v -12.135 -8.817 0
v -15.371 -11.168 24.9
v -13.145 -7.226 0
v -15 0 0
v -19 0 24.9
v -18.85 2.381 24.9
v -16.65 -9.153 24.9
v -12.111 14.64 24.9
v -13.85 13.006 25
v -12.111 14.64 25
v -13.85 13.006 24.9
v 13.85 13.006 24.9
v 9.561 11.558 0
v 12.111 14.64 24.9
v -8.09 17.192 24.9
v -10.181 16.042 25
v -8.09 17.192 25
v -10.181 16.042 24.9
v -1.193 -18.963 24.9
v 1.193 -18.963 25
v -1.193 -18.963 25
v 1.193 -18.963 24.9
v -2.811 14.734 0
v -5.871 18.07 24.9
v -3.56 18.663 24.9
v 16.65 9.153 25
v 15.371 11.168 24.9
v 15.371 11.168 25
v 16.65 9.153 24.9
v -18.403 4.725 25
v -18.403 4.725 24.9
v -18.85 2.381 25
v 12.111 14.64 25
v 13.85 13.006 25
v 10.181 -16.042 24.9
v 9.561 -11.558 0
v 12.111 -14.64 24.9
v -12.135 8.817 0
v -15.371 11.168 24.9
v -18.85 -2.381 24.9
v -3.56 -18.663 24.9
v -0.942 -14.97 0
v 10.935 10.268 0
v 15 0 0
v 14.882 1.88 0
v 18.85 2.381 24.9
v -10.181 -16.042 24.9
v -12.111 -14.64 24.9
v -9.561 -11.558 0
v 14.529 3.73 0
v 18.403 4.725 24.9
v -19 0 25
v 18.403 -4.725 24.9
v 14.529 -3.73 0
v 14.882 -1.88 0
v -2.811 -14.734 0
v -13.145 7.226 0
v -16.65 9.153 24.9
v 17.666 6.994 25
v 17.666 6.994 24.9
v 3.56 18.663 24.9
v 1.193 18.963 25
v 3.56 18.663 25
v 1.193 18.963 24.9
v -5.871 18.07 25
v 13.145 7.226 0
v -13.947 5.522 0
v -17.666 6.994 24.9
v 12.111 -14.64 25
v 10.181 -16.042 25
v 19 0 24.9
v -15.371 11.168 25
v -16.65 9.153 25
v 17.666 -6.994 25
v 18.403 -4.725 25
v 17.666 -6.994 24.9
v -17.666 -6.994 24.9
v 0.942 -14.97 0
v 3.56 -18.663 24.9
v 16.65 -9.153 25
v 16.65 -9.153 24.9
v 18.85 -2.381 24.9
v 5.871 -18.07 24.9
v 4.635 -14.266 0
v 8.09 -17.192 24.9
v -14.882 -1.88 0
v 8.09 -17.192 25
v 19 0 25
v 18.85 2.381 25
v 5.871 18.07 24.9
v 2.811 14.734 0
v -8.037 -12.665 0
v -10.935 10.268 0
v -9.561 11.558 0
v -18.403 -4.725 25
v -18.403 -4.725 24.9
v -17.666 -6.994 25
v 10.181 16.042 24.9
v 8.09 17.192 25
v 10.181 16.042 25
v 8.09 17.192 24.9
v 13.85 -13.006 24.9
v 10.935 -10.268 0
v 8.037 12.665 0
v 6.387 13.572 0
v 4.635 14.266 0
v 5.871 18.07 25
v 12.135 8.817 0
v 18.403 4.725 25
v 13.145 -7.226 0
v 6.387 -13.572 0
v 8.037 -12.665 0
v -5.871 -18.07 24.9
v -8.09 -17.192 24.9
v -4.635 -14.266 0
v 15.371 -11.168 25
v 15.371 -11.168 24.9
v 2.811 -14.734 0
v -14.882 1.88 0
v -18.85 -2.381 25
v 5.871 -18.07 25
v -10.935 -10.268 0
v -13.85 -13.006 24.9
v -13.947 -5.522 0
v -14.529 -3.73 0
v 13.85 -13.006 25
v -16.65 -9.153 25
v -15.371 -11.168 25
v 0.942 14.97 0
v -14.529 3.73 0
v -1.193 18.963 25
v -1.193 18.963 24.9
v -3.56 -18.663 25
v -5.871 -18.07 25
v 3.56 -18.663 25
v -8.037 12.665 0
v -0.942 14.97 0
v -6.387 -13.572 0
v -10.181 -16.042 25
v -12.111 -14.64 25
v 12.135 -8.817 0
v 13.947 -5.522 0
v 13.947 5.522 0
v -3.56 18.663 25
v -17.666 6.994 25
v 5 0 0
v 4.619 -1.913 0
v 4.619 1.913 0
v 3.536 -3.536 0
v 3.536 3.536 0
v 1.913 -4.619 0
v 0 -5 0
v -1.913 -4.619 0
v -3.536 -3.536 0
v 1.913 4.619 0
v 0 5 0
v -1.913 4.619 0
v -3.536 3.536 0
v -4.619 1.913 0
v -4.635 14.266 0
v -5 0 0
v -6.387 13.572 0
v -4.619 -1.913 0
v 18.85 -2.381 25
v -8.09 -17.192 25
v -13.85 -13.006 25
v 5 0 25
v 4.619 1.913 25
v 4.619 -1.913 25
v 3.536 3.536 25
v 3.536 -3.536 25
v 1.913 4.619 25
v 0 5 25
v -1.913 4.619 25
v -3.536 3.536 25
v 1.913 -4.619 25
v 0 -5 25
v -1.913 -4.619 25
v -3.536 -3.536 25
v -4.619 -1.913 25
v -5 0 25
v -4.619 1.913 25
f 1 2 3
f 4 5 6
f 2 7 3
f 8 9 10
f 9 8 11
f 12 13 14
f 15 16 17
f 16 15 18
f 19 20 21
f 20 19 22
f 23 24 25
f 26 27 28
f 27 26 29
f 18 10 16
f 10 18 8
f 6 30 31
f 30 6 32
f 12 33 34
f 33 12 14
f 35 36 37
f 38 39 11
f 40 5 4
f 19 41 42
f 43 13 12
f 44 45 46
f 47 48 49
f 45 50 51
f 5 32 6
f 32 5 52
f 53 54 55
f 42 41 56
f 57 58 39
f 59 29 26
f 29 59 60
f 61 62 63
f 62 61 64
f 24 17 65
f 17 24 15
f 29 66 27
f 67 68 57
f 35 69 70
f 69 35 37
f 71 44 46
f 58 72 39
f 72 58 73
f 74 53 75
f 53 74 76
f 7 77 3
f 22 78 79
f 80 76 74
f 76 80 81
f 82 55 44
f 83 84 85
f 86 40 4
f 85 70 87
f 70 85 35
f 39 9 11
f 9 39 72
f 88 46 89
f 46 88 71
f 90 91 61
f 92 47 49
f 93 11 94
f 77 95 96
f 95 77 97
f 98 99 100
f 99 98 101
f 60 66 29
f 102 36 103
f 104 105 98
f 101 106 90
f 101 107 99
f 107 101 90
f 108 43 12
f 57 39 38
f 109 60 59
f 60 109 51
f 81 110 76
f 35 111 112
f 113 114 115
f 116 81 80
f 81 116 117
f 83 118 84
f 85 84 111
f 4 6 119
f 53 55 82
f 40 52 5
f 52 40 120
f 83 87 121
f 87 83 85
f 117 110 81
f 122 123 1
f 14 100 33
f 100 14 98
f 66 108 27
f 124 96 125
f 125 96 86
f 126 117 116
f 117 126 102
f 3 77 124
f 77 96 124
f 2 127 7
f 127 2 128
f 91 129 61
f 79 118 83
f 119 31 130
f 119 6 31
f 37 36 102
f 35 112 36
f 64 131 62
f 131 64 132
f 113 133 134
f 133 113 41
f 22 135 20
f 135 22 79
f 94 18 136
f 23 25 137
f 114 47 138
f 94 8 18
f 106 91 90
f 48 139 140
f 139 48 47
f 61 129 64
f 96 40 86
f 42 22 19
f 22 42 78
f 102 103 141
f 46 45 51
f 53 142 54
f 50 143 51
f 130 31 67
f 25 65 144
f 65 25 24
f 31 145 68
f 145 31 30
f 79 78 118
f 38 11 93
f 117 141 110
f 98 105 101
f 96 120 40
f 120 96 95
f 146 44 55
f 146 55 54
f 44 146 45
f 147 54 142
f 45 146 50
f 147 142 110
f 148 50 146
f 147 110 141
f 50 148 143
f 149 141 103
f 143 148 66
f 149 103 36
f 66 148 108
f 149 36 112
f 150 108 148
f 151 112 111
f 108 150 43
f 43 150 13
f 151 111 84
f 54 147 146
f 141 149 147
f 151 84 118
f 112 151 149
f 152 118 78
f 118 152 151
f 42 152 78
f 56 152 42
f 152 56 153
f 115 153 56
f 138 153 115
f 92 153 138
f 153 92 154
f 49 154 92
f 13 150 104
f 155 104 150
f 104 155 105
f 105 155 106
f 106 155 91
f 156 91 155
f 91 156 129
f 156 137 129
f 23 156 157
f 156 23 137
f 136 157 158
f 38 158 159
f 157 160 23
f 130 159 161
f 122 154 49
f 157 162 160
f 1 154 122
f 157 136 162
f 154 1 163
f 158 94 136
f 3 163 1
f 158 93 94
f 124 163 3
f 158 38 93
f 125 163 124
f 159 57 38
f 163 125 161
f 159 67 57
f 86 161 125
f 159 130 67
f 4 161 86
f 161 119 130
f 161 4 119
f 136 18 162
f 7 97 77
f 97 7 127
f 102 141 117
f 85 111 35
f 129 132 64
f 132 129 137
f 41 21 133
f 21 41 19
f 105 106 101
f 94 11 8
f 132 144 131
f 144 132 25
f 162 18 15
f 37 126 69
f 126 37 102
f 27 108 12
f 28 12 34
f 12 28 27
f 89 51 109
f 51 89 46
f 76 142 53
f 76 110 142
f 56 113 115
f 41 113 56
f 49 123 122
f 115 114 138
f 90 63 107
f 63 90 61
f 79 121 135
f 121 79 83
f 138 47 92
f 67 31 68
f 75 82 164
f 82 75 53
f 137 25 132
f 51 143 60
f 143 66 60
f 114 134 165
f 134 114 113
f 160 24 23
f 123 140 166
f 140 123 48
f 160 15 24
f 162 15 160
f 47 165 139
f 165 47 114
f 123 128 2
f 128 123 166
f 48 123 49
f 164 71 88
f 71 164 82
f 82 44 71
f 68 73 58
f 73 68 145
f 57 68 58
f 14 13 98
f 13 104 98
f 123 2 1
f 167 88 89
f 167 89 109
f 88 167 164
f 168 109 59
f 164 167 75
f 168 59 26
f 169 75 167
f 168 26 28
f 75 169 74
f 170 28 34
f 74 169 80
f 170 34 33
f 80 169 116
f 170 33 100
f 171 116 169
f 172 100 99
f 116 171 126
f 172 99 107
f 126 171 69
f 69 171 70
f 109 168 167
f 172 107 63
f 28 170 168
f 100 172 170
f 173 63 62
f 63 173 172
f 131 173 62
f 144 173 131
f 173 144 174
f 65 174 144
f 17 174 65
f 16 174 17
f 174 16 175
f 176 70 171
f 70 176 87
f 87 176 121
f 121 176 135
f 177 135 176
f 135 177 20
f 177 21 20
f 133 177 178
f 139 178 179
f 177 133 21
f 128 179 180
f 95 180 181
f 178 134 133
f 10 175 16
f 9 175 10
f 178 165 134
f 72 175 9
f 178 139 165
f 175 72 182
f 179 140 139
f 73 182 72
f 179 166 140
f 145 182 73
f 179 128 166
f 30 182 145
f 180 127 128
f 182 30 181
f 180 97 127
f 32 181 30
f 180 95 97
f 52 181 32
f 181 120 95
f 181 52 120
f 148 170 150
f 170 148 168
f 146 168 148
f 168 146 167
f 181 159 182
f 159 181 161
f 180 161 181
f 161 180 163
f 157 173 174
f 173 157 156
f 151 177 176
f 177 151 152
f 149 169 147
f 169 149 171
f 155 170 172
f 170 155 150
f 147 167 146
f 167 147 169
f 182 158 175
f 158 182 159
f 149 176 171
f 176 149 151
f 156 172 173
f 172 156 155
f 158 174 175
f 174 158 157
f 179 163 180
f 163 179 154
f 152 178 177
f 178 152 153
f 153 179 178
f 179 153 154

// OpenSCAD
//## Stopfen fuer Gaerspund

RadiusBottom = 15;
RadiusTop = 19;
Height = 25;

difference() {
    hull() {
        cylinder(r=RadiusBottom, h=0.1, $fn=50);
        translate([0, 0, Height-0.1])
            cylinder(r=RadiusTop, h=0.1, $fn=50);
    }
    cylinder(r=5, h=Height);
}
